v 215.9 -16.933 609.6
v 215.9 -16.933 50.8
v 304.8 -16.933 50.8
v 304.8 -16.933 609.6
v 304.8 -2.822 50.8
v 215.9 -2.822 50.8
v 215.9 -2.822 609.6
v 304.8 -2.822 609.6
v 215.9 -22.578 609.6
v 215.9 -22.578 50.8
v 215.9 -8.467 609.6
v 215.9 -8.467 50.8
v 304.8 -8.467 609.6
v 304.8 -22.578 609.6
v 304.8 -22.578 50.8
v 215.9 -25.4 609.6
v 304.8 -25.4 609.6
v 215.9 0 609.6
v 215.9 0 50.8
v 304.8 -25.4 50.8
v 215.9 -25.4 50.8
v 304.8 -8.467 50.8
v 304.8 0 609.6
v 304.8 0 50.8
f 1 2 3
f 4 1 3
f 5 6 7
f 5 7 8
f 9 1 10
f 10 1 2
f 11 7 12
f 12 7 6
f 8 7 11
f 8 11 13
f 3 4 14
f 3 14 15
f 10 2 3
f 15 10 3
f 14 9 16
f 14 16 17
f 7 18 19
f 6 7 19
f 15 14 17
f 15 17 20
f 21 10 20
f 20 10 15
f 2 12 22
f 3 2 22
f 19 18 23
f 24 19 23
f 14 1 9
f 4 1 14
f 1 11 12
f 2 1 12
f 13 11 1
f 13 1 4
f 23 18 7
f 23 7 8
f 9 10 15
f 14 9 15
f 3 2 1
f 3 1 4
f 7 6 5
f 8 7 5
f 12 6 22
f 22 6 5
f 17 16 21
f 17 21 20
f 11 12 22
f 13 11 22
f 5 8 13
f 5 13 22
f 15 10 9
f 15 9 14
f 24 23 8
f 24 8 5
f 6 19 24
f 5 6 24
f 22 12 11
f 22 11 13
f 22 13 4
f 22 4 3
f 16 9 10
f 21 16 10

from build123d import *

# Parameters (mm, degrees)
SKETCH3_W                = 609.6
SKETCH3_H                = 1219.2
BOSS_EXTRUDE1_DEPTH      = 25.4
SPLIT1_SURFACE_1_1_BACK  = 1364.344
SPLIT1_SURFACE_1_1_DEPTH = 2728.688
SPLIT1_SURFACE_1_2_BACK  = 1364.344
SPLIT1_SURFACE_1_2_DEPTH = 2728.688
SPLIT1_SURFACE_2_3_BACK  = 1364.344
SPLIT1_SURFACE_2_3_DEPTH = 2728.688
SPLIT1_SURFACE_2_4_BACK  = 1364.344
SPLIT1_SURFACE_2_4_DEPTH = 2728.688
SPLIT1_SURFACE_3_5_BACK  = 1364.344
SPLIT1_SURFACE_3_5_DEPTH = 2728.688
SPLIT1_SURFACE_3_6_BACK  = 1364.344
SPLIT1_SURFACE_3_6_DEPTH = 2728.688
SPLIT1_SURFACE_4_7_BACK  = 1364.344
SPLIT1_SURFACE_4_7_DEPTH = 2728.688
SPLIT1_SURFACE_4_8_BACK  = 1364.344
SPLIT1_SURFACE_4_8_DEPTH = 2728.688
CUT_EXTRUDE1_DEPTH       = 25.4


with BuildPart() as part:
    # Sketch3 → Boss-Extrude1 (new body)
    with BuildSketch(Plane(origin=(0, 0, 0), x_dir=(1, 0, 0), z_dir=(0, 1, 0))):
        Rectangle(SKETCH3_W, SKETCH3_H)
    extrude(amount=-BOSS_EXTRUDE1_DEPTH)


with BuildPart() as body_2:
    # Split1: the piece behind the surface
    add(part.part)
    # Split1 surface 1: a surface, the sketch's curves swept straight by 2728.688 mm
    with BuildLine(Plane.XY.offset(-SPLIT1_SURFACE_1_1_BACK), mode=Mode.PRIVATE) as split1_surface_1_1_path:
        Line((-335.28, -22.577777778), (335.28, -22.577777778))
    split1_surface_1_1 = Shell.extrude(split1_surface_1_1_path.wire(), (0 * SPLIT1_SURFACE_1_1_DEPTH, 0 * SPLIT1_SURFACE_1_1_DEPTH, 1 * SPLIT1_SURFACE_1_1_DEPTH))
    split(bisect_by=split1_surface_1_1, keep=Keep.BOTTOM)


with BuildPart() as part_1:
    add(part.part)

    # Split1: split by a surface, the side it looks to stays
    # Split1 surface 1: a surface, the sketch's curves swept straight by 2728.688 mm
    with BuildLine(Plane.XY.offset(-SPLIT1_SURFACE_1_2_BACK), mode=Mode.PRIVATE) as split1_surface_1_2_path:
        Line((-335.28, -22.577777778), (335.28, -22.577777778))
    split1_surface_1_2 = Shell.extrude(split1_surface_1_2_path.wire(), (0 * SPLIT1_SURFACE_1_2_DEPTH, 0 * SPLIT1_SURFACE_1_2_DEPTH, 1 * SPLIT1_SURFACE_1_2_DEPTH))
    split(bisect_by=split1_surface_1_2, keep=Keep.TOP)


with BuildPart() as body_3:
    # Split1 2: the piece behind the surface
    add(part_1.part)
    # Split1 surface 2: a surface, the sketch's curves swept straight by 2728.688 mm
    with BuildLine(Plane.XY.offset(-SPLIT1_SURFACE_2_3_BACK), mode=Mode.PRIVATE) as split1_surface_2_3_path:
        Line((-335.28, -16.933333333), (335.28, -16.933333333))
    split1_surface_2_3 = Shell.extrude(split1_surface_2_3_path.wire(), (0 * SPLIT1_SURFACE_2_3_DEPTH, 0 * SPLIT1_SURFACE_2_3_DEPTH, 1 * SPLIT1_SURFACE_2_3_DEPTH))
    split(bisect_by=split1_surface_2_3, keep=Keep.BOTTOM)


with BuildPart() as part_2:
    add(part_1.part)

    # Split1 2: split by a surface, the side it looks to stays
    # Split1 surface 2: a surface, the sketch's curves swept straight by 2728.688 mm
    with BuildLine(Plane.XY.offset(-SPLIT1_SURFACE_2_4_BACK), mode=Mode.PRIVATE) as split1_surface_2_4_path:
        Line((-335.28, -16.933333333), (335.28, -16.933333333))
    split1_surface_2_4 = Shell.extrude(split1_surface_2_4_path.wire(), (0 * SPLIT1_SURFACE_2_4_DEPTH, 0 * SPLIT1_SURFACE_2_4_DEPTH, 1 * SPLIT1_SURFACE_2_4_DEPTH))
    split(bisect_by=split1_surface_2_4, keep=Keep.TOP)


with BuildPart() as body_4_2:
    # Split1 3: the piece behind the surface
    add(part_2.part)
    # Split1 surface 3: a surface, the sketch's curves swept straight by 2728.688 mm
    with BuildLine(Plane.XY.offset(-SPLIT1_SURFACE_3_5_BACK), mode=Mode.PRIVATE) as split1_surface_3_5_path:
        Line((-335.28, -2.822222222), (335.28, -2.822222222))
    split1_surface_3_5 = Shell.extrude(split1_surface_3_5_path.wire(), (0 * SPLIT1_SURFACE_3_5_DEPTH, 0 * SPLIT1_SURFACE_3_5_DEPTH, 1 * SPLIT1_SURFACE_3_5_DEPTH))
    split(bisect_by=split1_surface_3_5, keep=Keep.BOTTOM)


with BuildPart() as part_3:
    add(part_2.part)

    # Split1 3: split by a surface, the side it looks to stays
    # Split1 surface 3: a surface, the sketch's curves swept straight by 2728.688 mm
    with BuildLine(Plane.XY.offset(-SPLIT1_SURFACE_3_6_BACK), mode=Mode.PRIVATE) as split1_surface_3_6_path:
        Line((-335.28, -2.822222222), (335.28, -2.822222222))
    split1_surface_3_6 = Shell.extrude(split1_surface_3_6_path.wire(), (0 * SPLIT1_SURFACE_3_6_DEPTH, 0 * SPLIT1_SURFACE_3_6_DEPTH, 1 * SPLIT1_SURFACE_3_6_DEPTH))
    split(bisect_by=split1_surface_3_6, keep=Keep.TOP)


with BuildPart() as body_5_2:
    # Split1 4 body 4 2: the piece behind the surface
    add(body_4_2.part)
    # Split1 surface 4: a surface, the sketch's curves swept straight by 2728.688 mm
    with BuildLine(Plane.XY.offset(-SPLIT1_SURFACE_4_7_BACK), mode=Mode.PRIVATE) as split1_surface_4_7_path:
        Line((-335.28, -8.466666667), (335.28, -8.466666667))
    split1_surface_4_7 = Shell.extrude(split1_surface_4_7_path.wire(), (0 * SPLIT1_SURFACE_4_7_DEPTH, 0 * SPLIT1_SURFACE_4_7_DEPTH, 1 * SPLIT1_SURFACE_4_7_DEPTH))
    split(bisect_by=split1_surface_4_7, keep=Keep.BOTTOM)


with BuildPart() as body_4_2_1:
    add(body_4_2.part)

    # Split1 4 body 4 2: split by a surface, the side it looks to stays
    # Split1 surface 4: a surface, the sketch's curves swept straight by 2728.688 mm
    with BuildLine(Plane.XY.offset(-SPLIT1_SURFACE_4_8_BACK), mode=Mode.PRIVATE) as split1_surface_4_8_path:
        Line((-335.28, -8.466666667), (335.28, -8.466666667))
    split1_surface_4_8 = Shell.extrude(split1_surface_4_8_path.wire(), (0 * SPLIT1_SURFACE_4_8_DEPTH, 0 * SPLIT1_SURFACE_4_8_DEPTH, 1 * SPLIT1_SURFACE_4_8_DEPTH))
    split(bisect_by=split1_surface_4_8, keep=Keep.TOP)


with BuildPart() as cut_extrude1_tool:
    # Sketch6 → Cut-Extrude1 (new body)
    with BuildSketch(Plane(origin=(0, 0, 0), x_dir=(1, 0, 0), z_dir=(0, 1, 0))):
        Polygon((-304.8, -609.6), (215.9, -609.6), (215.9, -50.8), (304.8, -50.8), (304.8, 609.6), (-304.8, 609.6), align=None)
    extrude(amount=-CUT_EXTRUDE1_DEPTH)


with BuildPart() as part_4:
    add(part_3.part)

    # Cut-Extrude1: cut by cut_extrude1_tool
    add(cut_extrude1_tool.part, mode=Mode.SUBTRACT)


with BuildPart() as body_2_1:
    add(body_2.part)

    # Cut-Extrude1: cut by cut_extrude1_tool
    add(cut_extrude1_tool.part, mode=Mode.SUBTRACT)


with BuildPart() as body_3_1:
    add(body_3.part)

    # Cut-Extrude1: cut by cut_extrude1_tool
    add(cut_extrude1_tool.part, mode=Mode.SUBTRACT)


with BuildPart() as body_4_2_2:
    add(body_4_2_1.part)

    # Cut-Extrude1: cut by cut_extrude1_tool
    add(cut_extrude1_tool.part, mode=Mode.SUBTRACT)


with BuildPart() as body_5_2_1:
    add(body_5_2.part)

    # Cut-Extrude1: cut by cut_extrude1_tool
    add(cut_extrude1_tool.part, mode=Mode.SUBTRACT)


solid = Compound([part_4.part, body_2_1.part, body_3_1.part, body_4_2_2.part, body_5_2_1.part])
